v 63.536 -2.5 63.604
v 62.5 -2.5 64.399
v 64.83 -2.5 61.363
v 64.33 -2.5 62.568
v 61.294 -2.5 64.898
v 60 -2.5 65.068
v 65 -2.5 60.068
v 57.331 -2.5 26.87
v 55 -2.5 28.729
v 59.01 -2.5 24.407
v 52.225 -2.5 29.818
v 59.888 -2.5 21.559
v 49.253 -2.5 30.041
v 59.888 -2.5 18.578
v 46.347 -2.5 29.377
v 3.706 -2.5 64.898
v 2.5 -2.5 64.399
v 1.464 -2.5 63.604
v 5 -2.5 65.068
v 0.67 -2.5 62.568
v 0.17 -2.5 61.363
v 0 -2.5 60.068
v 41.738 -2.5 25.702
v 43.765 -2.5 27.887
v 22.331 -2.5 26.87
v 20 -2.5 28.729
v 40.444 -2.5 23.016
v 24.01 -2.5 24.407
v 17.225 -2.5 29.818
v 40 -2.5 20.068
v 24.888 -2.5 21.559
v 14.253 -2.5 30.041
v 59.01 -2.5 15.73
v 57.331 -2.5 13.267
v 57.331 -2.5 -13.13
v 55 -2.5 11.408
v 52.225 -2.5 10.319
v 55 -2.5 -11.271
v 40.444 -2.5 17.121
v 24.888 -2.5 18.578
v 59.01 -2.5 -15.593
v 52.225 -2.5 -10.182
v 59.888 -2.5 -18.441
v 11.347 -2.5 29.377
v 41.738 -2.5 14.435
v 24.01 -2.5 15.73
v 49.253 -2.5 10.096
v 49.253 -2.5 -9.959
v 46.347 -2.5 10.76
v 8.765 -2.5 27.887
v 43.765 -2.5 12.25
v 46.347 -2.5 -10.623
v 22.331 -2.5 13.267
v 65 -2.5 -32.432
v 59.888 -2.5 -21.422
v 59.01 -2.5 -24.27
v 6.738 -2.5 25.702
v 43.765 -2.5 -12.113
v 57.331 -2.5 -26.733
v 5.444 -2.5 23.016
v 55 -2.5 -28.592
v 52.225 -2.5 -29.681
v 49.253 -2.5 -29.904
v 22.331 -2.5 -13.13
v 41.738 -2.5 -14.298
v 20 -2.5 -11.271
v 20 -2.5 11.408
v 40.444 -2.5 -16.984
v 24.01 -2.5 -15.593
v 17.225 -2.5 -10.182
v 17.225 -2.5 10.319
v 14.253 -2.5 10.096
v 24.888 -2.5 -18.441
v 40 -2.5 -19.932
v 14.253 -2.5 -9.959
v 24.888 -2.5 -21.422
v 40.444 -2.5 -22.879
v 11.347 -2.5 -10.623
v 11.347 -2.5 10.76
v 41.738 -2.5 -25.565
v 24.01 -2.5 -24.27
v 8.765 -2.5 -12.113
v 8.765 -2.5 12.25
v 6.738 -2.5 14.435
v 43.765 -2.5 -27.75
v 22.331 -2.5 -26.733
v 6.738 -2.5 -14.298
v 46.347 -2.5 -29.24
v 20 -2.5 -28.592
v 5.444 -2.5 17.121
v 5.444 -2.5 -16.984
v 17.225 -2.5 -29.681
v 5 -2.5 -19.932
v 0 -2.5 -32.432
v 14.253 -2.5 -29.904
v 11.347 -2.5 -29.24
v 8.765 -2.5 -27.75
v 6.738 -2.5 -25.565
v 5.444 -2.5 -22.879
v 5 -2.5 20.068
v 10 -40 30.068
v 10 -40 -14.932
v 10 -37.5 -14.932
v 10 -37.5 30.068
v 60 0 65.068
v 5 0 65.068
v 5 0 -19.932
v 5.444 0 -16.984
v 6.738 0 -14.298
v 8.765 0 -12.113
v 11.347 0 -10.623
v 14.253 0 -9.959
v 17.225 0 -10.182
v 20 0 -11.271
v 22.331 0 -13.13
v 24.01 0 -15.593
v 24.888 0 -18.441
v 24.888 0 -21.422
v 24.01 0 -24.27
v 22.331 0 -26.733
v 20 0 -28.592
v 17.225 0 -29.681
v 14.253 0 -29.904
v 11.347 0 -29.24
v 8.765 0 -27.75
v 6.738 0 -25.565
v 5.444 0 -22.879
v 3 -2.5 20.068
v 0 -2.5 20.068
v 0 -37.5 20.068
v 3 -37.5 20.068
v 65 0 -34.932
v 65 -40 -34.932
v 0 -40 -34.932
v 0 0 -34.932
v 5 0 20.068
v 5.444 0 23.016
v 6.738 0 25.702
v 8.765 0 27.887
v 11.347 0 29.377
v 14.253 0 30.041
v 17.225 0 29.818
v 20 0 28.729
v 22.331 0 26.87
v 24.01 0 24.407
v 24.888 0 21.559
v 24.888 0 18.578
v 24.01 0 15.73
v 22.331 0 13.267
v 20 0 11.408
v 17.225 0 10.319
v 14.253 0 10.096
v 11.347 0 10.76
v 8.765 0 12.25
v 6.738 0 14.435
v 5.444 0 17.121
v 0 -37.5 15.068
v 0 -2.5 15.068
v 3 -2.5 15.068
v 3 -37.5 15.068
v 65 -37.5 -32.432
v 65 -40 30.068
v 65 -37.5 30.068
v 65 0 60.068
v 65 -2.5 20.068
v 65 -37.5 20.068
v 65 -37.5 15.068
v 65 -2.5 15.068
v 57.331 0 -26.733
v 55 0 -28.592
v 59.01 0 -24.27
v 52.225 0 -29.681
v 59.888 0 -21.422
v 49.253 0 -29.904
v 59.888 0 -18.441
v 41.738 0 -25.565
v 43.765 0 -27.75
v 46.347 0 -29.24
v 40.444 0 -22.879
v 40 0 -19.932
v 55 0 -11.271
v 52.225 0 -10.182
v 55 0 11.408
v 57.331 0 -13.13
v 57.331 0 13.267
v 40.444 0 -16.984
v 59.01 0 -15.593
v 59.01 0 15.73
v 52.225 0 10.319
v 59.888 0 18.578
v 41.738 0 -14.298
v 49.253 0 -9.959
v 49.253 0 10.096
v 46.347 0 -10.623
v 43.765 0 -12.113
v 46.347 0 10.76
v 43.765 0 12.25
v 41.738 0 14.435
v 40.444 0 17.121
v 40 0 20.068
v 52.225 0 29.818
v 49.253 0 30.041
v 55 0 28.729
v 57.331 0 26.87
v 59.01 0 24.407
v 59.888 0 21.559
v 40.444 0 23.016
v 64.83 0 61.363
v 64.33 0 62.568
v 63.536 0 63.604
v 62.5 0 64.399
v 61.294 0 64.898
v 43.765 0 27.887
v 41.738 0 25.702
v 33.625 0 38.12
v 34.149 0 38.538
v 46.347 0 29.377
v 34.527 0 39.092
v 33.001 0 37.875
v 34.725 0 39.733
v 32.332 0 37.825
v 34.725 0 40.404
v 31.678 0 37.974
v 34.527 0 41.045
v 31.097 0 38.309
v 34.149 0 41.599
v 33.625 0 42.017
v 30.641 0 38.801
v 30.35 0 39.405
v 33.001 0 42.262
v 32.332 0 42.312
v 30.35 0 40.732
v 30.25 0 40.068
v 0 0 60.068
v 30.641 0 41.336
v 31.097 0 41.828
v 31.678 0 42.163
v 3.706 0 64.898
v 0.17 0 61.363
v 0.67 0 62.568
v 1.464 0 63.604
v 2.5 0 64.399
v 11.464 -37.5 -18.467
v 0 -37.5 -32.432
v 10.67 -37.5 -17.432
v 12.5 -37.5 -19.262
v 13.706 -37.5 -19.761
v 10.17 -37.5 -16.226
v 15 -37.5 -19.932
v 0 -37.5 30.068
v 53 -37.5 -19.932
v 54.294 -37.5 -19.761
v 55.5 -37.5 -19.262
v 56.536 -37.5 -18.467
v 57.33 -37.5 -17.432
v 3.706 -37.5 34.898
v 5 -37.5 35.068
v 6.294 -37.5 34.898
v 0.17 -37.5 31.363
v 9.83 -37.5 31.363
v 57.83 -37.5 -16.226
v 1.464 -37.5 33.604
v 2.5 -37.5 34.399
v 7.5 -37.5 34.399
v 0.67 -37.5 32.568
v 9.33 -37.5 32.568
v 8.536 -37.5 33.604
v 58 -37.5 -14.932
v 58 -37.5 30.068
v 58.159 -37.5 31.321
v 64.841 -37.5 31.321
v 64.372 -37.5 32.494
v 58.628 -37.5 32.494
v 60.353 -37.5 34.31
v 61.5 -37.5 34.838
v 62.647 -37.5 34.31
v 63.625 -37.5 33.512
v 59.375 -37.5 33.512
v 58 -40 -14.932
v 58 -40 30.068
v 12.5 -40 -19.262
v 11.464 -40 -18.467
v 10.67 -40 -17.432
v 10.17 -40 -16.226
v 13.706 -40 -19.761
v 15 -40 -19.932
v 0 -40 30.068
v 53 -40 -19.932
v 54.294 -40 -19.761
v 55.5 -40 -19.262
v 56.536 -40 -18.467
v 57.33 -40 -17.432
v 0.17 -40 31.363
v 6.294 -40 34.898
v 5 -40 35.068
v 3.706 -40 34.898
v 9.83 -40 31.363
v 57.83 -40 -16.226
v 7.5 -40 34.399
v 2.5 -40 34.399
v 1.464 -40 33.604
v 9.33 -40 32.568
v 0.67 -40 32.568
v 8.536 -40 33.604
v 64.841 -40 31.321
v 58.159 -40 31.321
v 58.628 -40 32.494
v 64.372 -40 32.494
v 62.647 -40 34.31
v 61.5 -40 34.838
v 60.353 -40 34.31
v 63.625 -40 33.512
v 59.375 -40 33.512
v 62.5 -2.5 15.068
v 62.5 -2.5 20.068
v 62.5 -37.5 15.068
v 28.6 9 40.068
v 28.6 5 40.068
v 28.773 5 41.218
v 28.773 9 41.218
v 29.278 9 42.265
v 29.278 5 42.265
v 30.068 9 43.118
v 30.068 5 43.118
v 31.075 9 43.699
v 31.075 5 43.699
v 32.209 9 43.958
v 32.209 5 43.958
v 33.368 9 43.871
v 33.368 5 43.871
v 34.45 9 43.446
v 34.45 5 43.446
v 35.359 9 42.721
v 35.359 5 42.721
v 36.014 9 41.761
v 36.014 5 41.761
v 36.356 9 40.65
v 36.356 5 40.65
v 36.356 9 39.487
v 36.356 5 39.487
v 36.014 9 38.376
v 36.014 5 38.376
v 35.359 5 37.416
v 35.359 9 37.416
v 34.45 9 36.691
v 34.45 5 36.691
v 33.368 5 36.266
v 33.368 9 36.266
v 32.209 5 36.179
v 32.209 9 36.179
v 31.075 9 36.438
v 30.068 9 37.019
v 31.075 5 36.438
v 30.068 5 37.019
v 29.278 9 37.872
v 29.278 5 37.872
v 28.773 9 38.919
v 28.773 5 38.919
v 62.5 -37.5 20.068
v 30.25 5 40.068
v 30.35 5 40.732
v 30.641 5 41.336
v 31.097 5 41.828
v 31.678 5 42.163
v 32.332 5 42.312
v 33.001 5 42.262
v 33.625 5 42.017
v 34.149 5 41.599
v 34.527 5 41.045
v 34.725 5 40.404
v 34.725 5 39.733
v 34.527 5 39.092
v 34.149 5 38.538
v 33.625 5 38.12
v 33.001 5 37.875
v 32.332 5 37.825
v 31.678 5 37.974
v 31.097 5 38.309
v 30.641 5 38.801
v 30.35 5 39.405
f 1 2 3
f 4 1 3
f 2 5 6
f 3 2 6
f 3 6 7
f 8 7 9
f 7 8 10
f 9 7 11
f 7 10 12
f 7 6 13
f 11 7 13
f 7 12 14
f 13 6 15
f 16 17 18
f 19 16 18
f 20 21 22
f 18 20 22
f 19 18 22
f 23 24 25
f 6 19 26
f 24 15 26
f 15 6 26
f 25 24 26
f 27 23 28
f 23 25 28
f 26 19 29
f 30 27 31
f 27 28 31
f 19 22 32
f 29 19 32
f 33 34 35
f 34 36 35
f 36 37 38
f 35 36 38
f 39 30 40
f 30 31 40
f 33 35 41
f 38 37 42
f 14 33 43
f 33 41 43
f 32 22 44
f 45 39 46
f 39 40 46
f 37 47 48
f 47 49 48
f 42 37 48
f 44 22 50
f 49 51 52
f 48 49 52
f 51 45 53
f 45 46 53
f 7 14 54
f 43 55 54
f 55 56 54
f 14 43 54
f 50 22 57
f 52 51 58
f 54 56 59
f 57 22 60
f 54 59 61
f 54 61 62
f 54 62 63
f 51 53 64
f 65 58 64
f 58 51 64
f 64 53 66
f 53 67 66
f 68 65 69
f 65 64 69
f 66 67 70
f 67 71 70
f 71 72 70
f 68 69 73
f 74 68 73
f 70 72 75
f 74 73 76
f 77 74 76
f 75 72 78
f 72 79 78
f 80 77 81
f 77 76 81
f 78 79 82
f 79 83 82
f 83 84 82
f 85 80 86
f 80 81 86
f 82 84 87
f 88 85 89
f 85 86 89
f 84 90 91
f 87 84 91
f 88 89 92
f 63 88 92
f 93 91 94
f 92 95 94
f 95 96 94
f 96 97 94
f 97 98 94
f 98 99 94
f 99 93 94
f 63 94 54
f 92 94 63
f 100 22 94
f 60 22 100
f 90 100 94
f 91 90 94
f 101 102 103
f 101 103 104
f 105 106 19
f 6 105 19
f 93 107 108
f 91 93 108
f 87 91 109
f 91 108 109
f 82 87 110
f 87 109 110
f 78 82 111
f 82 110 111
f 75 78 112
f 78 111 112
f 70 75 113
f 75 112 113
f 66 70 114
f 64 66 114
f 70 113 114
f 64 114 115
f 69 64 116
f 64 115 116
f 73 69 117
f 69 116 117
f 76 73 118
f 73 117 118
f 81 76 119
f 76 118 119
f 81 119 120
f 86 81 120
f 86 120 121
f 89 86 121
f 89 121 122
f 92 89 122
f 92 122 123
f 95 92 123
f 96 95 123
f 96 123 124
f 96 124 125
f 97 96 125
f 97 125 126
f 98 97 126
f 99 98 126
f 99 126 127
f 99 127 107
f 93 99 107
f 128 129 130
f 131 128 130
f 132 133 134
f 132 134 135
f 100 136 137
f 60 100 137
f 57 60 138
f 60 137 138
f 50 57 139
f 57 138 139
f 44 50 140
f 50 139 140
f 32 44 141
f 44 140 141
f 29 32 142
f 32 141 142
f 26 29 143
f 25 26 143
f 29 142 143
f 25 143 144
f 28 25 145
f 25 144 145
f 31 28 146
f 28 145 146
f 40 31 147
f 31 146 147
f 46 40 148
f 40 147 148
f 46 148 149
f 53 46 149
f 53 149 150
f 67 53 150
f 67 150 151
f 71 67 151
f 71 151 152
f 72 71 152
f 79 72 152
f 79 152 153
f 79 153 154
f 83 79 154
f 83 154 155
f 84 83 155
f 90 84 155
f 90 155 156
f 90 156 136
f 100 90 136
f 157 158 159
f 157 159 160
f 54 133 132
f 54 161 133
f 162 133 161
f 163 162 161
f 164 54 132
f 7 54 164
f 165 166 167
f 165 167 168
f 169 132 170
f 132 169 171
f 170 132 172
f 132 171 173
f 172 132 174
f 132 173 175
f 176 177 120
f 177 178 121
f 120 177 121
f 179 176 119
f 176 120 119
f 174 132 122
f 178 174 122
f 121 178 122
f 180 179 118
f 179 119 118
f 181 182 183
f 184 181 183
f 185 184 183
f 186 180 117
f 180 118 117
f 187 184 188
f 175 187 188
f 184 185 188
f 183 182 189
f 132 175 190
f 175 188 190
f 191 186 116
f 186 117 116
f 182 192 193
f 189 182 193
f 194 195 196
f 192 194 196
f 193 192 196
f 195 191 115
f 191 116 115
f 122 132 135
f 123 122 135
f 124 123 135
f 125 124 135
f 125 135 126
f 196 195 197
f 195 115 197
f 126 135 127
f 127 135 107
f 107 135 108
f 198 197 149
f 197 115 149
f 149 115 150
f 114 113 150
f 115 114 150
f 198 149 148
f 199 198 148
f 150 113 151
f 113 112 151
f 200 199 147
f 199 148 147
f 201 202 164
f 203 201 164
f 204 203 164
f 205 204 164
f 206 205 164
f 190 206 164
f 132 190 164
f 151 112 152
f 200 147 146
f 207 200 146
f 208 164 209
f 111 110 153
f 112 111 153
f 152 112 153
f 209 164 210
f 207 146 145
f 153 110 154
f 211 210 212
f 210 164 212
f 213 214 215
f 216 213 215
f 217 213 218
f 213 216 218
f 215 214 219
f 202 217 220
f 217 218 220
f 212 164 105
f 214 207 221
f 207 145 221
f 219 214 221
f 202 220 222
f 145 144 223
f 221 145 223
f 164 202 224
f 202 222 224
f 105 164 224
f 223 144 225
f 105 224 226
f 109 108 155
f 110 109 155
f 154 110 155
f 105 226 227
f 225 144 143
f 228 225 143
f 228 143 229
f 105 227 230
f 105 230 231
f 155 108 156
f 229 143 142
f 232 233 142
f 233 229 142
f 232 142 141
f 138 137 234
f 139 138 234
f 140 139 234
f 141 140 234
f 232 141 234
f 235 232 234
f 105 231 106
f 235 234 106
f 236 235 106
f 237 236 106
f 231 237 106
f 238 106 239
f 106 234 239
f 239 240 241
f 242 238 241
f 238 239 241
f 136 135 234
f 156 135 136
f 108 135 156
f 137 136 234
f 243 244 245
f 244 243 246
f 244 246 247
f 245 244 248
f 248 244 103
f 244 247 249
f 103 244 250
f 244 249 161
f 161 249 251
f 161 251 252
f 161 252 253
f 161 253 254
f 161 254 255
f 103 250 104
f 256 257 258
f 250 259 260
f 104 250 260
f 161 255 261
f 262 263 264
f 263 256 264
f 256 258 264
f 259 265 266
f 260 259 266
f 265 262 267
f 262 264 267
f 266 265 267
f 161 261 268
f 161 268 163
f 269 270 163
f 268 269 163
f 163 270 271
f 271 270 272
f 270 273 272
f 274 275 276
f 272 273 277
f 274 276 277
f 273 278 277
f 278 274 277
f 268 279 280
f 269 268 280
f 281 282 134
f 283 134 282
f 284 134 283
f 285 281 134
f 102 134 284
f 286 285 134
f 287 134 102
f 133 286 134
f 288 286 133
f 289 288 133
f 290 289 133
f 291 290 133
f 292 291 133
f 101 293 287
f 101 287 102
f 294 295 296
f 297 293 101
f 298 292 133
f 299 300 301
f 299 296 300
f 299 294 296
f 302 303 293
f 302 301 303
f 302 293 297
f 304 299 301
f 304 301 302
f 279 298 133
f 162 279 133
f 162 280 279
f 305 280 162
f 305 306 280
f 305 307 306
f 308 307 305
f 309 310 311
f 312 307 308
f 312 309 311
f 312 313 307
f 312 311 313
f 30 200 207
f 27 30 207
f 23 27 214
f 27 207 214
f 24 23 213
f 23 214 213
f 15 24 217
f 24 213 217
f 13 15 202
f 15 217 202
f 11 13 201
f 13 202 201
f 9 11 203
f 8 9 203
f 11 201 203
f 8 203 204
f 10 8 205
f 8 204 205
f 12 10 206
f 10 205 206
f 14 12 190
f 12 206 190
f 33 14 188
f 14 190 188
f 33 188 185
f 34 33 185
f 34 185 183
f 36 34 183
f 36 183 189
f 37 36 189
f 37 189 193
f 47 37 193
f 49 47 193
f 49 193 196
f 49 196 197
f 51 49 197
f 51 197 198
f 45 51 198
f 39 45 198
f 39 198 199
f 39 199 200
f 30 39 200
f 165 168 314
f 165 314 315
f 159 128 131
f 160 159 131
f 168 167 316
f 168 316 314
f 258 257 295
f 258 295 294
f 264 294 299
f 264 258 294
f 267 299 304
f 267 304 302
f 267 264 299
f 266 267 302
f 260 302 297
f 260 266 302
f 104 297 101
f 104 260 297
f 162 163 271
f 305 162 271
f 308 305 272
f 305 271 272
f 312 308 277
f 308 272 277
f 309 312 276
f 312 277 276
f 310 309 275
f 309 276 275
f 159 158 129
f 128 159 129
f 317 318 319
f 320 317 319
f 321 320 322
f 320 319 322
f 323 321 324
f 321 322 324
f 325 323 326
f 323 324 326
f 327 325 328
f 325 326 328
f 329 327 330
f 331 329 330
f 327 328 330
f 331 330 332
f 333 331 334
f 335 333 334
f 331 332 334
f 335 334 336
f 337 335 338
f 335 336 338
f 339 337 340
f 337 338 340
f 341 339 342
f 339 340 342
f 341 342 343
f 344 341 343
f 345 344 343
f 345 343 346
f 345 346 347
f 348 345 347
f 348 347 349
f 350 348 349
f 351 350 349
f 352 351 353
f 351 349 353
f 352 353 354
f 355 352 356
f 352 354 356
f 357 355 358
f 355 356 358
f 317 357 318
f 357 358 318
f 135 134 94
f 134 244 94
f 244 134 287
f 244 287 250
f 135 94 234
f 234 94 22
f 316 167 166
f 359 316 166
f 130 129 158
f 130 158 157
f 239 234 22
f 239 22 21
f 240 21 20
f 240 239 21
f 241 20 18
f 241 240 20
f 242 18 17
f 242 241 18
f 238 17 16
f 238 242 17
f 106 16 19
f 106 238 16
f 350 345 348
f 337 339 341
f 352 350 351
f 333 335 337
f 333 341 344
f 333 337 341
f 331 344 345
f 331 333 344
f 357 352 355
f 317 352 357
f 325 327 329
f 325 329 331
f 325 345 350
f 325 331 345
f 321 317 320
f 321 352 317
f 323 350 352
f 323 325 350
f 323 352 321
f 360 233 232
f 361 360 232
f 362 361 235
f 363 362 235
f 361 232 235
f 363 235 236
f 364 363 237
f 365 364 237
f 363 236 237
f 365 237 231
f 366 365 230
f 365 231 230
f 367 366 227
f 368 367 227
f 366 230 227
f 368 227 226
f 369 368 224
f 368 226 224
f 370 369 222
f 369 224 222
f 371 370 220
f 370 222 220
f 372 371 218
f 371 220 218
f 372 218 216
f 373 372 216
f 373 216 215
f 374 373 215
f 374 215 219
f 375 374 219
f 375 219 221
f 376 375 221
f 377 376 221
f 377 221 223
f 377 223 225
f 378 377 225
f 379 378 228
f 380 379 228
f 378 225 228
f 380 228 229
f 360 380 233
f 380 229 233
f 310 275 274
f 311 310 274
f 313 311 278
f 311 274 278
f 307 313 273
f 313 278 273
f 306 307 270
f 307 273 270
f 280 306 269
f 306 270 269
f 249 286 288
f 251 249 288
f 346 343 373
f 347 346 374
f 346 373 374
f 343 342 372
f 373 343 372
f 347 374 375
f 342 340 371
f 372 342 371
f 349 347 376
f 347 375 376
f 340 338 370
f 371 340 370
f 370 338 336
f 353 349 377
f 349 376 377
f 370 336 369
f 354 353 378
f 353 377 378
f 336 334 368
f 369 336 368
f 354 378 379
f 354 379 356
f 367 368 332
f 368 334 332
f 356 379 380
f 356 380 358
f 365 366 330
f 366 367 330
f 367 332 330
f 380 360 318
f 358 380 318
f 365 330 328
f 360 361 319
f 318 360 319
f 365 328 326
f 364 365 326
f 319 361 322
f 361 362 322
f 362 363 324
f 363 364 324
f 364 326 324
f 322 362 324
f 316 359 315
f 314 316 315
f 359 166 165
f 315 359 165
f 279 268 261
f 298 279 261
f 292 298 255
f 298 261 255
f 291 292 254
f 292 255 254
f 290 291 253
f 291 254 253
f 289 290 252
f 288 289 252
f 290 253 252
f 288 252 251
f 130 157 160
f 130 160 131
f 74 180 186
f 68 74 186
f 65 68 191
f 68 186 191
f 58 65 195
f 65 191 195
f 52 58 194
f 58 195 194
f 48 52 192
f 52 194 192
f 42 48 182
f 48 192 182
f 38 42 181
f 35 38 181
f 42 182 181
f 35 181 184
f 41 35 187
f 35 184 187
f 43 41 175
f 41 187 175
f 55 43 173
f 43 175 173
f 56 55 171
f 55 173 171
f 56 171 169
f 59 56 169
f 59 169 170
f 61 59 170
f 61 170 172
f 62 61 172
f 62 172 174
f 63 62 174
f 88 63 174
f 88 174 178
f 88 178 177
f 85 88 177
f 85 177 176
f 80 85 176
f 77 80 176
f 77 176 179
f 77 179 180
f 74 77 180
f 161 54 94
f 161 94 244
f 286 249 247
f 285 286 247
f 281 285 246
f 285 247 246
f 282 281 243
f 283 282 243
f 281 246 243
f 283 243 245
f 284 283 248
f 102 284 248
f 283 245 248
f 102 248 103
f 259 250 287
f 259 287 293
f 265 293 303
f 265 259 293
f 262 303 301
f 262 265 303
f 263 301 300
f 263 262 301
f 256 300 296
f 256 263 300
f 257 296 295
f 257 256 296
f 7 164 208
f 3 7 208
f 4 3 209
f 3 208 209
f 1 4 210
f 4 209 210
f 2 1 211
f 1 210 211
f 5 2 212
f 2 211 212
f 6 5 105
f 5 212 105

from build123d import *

# Parameters (mm, degrees)
F1_DEPTH     = 65
F2_W         = 48
F2_H         = 55
F3_DEPTH     = 10
F4_R         = 2.25
F5_DEPTH     = 5
F6_R         = 3.9
F6_R_2       = 2.25
F7_DEPTH     = 4
F8_R         = 10
F9_DEPTH     = 4
F10_W        = 35
F10_H        = 5
F11_DEPTH    = 2.5
F12_W        = 35
F12_H        = 5
F13_DEPTH    = 3
F14_T1_DEPTH = 2.5
F14_T3_DEPTH = 27.5
F14_T5_DEPTH = 27.5


# Not quite as in the source:
# - a fillet or chamfer that OpenCascade refuses, or shapes differently, is made with other operations: its cross-section is extruded or revolved along the edge and cut away or added


with BuildPart() as f1:
    # F0 (on Right) → F1 (new body)
    with BuildSketch(Plane.YZ):
        Polygon((0, -34.9315267816), (0, 65.0684732184), (-2.5, 65.0684732184), (-2.5, -32.4315267816), (-37.5, -32.4315267816), (-37.5, 35.0684732184), (-40, 35.0684732184), (-40, -34.9315267816), align=None)
    extrude(amount=F1_DEPTH)

    # F2 (on face) → F3 (cut)
    with BuildSketch(Plane.XZ.offset(40)):
        with Locations((34, 7.5684732184)):
            Rectangle(F2_W, F2_H)
    extrude(amount=-F3_DEPTH, mode=Mode.SUBTRACT)

    # F4 (on face) → F5 (join)
    with BuildSketch(Plane(origin=(0, 0, 0), x_dir=(-1, 0, 0), z_dir=(0, 1, 0))):
        with Locations((-32.5, 40.0684732184)):
            Circle(F4_R)
    extrude(amount=F5_DEPTH)

    # F6 (on face) → F7 (join)
    with BuildSketch(Plane(origin=(0, 5, 0), x_dir=(-1, 0, 0), z_dir=(0, 1, 0))):
        with Locations((-32.5, 40.0684732184)):
            Circle(F6_R)
        with Locations((-32.5, 40.0684732184)):
            Circle(F6_R_2, mode=Mode.SUBTRACT)
        with Locations((-32.5, 40.0684732184)):
            Circle(F6_R_2)
    extrude(amount=F7_DEPTH)

    # F8 (on face) → F9 (cut)
    with BuildSketch(Plane(origin=(0, 0, 0), x_dir=(-1, 0, 0), z_dir=(0, 1, 0))):
        with Locations((-50, 20.0684732184)):
            Circle(F8_R)
        with Locations((-15, 20.0684732184)):
            Circle(F8_R)
        with Locations((-15, -19.9315267816)):
            Circle(F8_R)
        with Locations((-50, -19.9315267816)):
            Circle(F8_R)
    extrude(amount=-F9_DEPTH, mode=Mode.SUBTRACT)

    # F14: fillet of radius 5 on 8 edges, made by hand

    # F14_s2 → F14_t1 (join)
    with BuildSketch(Plane.XZ.offset(37.5)):
        with BuildLine():
            ThreePointArc((15, -19.9315267816), (11.4644660941, -18.4670606876), (10, -14.9315267816))
            Line((10, -14.9315267816), (10, -19.9315267816))
            Line((10, -19.9315267816), (15, -19.9315267816))
        make_face()
        with BuildLine():
            ThreePointArc((58, -14.9315267816), (56.5355339059, -18.4670606876), (53, -19.9315267816))
            Line((53, -19.9315267816), (58, -19.9315267816))
            Line((58, -19.9315267816), (58, -14.9315267816))
        make_face()
    extrude(amount=F14_T1_DEPTH)

    # F14_s4 → F14_t3 (cut)
    with BuildSketch(Plane.XZ.offset(25)):
        with BuildLine():
            ThreePointArc((0, 30.0684732184), (1.4644660941, 33.6040071243), (5, 35.0684732184))
            Line((5, 35.0684732184), (0, 35.0684732184))
            Line((0, 35.0684732184), (0, 30.0684732184))
        make_face()
        with BuildLine():
            ThreePointArc((5, 35.0684732184), (8.5355339059, 33.6040071243), (10, 30.0684732184))
            Line((10, 30.0684732184), (10, 35.0684732184))
            Line((10, 35.0684732184), (5, 35.0684732184))
        make_face()
        with BuildLine():
            ThreePointArc((63, 35.0684732184), (59.4644660941, 33.6040071243), (58, 30.0684732184))
            Line((58, 30.0684732184), (58, 35.0684732184))
            Line((58, 35.0684732184), (63, 35.0684732184))
        make_face()
        with BuildLine():
            ThreePointArc((65, 30.0684732184), (63.5355339059, 33.6040071243), (60, 35.0684732184))
            Line((60, 35.0684732184), (65, 35.0684732184))
            Line((65, 35.0684732184), (65, 30.0684732184))
        make_face()
    extrude(amount=F14_T3_DEPTH, mode=Mode.SUBTRACT)

    # F14_s6 → F14_t5 (cut)
    with BuildSketch(Plane.XZ.offset(-12.5)):
        with BuildLine():
            ThreePointArc((65, 60.0684732184), (63.5355339059, 63.6040071243), (60, 65.0684732184))
            Line((60, 65.0684732184), (65, 65.0684732184))
            Line((65, 65.0684732184), (65, 60.0684732184))
        make_face()
        with BuildLine():
            ThreePointArc((0, 60.0684732184), (1.4644660941, 63.6040071243), (5, 65.0684732184))
            Line((5, 65.0684732184), (0, 65.0684732184))
            Line((0, 65.0684732184), (0, 60.0684732184))
        make_face()
    extrude(amount=F14_T5_DEPTH, mode=Mode.SUBTRACT)


with BuildPart() as f11:
    # F10 (on face) → F11 (new body)
    with BuildSketch(Plane.YZ.offset(65)):
        with Locations((-20, 17.5684732184)):
            Rectangle(F10_W, F10_H)
    extrude(amount=-F11_DEPTH)


with BuildPart() as f13:
    # F12 (on face) → F13 (new body)
    with BuildSketch(Plane(origin=(0, 0, 0), x_dir=(0, -1, 0), z_dir=(-1, 0, 0))):
        with Locations((20, 17.5684732184)):
            Rectangle(F12_W, F12_H)
    extrude(amount=-F13_DEPTH)


solid = Compound([f1.part, f11.part, f13.part])
